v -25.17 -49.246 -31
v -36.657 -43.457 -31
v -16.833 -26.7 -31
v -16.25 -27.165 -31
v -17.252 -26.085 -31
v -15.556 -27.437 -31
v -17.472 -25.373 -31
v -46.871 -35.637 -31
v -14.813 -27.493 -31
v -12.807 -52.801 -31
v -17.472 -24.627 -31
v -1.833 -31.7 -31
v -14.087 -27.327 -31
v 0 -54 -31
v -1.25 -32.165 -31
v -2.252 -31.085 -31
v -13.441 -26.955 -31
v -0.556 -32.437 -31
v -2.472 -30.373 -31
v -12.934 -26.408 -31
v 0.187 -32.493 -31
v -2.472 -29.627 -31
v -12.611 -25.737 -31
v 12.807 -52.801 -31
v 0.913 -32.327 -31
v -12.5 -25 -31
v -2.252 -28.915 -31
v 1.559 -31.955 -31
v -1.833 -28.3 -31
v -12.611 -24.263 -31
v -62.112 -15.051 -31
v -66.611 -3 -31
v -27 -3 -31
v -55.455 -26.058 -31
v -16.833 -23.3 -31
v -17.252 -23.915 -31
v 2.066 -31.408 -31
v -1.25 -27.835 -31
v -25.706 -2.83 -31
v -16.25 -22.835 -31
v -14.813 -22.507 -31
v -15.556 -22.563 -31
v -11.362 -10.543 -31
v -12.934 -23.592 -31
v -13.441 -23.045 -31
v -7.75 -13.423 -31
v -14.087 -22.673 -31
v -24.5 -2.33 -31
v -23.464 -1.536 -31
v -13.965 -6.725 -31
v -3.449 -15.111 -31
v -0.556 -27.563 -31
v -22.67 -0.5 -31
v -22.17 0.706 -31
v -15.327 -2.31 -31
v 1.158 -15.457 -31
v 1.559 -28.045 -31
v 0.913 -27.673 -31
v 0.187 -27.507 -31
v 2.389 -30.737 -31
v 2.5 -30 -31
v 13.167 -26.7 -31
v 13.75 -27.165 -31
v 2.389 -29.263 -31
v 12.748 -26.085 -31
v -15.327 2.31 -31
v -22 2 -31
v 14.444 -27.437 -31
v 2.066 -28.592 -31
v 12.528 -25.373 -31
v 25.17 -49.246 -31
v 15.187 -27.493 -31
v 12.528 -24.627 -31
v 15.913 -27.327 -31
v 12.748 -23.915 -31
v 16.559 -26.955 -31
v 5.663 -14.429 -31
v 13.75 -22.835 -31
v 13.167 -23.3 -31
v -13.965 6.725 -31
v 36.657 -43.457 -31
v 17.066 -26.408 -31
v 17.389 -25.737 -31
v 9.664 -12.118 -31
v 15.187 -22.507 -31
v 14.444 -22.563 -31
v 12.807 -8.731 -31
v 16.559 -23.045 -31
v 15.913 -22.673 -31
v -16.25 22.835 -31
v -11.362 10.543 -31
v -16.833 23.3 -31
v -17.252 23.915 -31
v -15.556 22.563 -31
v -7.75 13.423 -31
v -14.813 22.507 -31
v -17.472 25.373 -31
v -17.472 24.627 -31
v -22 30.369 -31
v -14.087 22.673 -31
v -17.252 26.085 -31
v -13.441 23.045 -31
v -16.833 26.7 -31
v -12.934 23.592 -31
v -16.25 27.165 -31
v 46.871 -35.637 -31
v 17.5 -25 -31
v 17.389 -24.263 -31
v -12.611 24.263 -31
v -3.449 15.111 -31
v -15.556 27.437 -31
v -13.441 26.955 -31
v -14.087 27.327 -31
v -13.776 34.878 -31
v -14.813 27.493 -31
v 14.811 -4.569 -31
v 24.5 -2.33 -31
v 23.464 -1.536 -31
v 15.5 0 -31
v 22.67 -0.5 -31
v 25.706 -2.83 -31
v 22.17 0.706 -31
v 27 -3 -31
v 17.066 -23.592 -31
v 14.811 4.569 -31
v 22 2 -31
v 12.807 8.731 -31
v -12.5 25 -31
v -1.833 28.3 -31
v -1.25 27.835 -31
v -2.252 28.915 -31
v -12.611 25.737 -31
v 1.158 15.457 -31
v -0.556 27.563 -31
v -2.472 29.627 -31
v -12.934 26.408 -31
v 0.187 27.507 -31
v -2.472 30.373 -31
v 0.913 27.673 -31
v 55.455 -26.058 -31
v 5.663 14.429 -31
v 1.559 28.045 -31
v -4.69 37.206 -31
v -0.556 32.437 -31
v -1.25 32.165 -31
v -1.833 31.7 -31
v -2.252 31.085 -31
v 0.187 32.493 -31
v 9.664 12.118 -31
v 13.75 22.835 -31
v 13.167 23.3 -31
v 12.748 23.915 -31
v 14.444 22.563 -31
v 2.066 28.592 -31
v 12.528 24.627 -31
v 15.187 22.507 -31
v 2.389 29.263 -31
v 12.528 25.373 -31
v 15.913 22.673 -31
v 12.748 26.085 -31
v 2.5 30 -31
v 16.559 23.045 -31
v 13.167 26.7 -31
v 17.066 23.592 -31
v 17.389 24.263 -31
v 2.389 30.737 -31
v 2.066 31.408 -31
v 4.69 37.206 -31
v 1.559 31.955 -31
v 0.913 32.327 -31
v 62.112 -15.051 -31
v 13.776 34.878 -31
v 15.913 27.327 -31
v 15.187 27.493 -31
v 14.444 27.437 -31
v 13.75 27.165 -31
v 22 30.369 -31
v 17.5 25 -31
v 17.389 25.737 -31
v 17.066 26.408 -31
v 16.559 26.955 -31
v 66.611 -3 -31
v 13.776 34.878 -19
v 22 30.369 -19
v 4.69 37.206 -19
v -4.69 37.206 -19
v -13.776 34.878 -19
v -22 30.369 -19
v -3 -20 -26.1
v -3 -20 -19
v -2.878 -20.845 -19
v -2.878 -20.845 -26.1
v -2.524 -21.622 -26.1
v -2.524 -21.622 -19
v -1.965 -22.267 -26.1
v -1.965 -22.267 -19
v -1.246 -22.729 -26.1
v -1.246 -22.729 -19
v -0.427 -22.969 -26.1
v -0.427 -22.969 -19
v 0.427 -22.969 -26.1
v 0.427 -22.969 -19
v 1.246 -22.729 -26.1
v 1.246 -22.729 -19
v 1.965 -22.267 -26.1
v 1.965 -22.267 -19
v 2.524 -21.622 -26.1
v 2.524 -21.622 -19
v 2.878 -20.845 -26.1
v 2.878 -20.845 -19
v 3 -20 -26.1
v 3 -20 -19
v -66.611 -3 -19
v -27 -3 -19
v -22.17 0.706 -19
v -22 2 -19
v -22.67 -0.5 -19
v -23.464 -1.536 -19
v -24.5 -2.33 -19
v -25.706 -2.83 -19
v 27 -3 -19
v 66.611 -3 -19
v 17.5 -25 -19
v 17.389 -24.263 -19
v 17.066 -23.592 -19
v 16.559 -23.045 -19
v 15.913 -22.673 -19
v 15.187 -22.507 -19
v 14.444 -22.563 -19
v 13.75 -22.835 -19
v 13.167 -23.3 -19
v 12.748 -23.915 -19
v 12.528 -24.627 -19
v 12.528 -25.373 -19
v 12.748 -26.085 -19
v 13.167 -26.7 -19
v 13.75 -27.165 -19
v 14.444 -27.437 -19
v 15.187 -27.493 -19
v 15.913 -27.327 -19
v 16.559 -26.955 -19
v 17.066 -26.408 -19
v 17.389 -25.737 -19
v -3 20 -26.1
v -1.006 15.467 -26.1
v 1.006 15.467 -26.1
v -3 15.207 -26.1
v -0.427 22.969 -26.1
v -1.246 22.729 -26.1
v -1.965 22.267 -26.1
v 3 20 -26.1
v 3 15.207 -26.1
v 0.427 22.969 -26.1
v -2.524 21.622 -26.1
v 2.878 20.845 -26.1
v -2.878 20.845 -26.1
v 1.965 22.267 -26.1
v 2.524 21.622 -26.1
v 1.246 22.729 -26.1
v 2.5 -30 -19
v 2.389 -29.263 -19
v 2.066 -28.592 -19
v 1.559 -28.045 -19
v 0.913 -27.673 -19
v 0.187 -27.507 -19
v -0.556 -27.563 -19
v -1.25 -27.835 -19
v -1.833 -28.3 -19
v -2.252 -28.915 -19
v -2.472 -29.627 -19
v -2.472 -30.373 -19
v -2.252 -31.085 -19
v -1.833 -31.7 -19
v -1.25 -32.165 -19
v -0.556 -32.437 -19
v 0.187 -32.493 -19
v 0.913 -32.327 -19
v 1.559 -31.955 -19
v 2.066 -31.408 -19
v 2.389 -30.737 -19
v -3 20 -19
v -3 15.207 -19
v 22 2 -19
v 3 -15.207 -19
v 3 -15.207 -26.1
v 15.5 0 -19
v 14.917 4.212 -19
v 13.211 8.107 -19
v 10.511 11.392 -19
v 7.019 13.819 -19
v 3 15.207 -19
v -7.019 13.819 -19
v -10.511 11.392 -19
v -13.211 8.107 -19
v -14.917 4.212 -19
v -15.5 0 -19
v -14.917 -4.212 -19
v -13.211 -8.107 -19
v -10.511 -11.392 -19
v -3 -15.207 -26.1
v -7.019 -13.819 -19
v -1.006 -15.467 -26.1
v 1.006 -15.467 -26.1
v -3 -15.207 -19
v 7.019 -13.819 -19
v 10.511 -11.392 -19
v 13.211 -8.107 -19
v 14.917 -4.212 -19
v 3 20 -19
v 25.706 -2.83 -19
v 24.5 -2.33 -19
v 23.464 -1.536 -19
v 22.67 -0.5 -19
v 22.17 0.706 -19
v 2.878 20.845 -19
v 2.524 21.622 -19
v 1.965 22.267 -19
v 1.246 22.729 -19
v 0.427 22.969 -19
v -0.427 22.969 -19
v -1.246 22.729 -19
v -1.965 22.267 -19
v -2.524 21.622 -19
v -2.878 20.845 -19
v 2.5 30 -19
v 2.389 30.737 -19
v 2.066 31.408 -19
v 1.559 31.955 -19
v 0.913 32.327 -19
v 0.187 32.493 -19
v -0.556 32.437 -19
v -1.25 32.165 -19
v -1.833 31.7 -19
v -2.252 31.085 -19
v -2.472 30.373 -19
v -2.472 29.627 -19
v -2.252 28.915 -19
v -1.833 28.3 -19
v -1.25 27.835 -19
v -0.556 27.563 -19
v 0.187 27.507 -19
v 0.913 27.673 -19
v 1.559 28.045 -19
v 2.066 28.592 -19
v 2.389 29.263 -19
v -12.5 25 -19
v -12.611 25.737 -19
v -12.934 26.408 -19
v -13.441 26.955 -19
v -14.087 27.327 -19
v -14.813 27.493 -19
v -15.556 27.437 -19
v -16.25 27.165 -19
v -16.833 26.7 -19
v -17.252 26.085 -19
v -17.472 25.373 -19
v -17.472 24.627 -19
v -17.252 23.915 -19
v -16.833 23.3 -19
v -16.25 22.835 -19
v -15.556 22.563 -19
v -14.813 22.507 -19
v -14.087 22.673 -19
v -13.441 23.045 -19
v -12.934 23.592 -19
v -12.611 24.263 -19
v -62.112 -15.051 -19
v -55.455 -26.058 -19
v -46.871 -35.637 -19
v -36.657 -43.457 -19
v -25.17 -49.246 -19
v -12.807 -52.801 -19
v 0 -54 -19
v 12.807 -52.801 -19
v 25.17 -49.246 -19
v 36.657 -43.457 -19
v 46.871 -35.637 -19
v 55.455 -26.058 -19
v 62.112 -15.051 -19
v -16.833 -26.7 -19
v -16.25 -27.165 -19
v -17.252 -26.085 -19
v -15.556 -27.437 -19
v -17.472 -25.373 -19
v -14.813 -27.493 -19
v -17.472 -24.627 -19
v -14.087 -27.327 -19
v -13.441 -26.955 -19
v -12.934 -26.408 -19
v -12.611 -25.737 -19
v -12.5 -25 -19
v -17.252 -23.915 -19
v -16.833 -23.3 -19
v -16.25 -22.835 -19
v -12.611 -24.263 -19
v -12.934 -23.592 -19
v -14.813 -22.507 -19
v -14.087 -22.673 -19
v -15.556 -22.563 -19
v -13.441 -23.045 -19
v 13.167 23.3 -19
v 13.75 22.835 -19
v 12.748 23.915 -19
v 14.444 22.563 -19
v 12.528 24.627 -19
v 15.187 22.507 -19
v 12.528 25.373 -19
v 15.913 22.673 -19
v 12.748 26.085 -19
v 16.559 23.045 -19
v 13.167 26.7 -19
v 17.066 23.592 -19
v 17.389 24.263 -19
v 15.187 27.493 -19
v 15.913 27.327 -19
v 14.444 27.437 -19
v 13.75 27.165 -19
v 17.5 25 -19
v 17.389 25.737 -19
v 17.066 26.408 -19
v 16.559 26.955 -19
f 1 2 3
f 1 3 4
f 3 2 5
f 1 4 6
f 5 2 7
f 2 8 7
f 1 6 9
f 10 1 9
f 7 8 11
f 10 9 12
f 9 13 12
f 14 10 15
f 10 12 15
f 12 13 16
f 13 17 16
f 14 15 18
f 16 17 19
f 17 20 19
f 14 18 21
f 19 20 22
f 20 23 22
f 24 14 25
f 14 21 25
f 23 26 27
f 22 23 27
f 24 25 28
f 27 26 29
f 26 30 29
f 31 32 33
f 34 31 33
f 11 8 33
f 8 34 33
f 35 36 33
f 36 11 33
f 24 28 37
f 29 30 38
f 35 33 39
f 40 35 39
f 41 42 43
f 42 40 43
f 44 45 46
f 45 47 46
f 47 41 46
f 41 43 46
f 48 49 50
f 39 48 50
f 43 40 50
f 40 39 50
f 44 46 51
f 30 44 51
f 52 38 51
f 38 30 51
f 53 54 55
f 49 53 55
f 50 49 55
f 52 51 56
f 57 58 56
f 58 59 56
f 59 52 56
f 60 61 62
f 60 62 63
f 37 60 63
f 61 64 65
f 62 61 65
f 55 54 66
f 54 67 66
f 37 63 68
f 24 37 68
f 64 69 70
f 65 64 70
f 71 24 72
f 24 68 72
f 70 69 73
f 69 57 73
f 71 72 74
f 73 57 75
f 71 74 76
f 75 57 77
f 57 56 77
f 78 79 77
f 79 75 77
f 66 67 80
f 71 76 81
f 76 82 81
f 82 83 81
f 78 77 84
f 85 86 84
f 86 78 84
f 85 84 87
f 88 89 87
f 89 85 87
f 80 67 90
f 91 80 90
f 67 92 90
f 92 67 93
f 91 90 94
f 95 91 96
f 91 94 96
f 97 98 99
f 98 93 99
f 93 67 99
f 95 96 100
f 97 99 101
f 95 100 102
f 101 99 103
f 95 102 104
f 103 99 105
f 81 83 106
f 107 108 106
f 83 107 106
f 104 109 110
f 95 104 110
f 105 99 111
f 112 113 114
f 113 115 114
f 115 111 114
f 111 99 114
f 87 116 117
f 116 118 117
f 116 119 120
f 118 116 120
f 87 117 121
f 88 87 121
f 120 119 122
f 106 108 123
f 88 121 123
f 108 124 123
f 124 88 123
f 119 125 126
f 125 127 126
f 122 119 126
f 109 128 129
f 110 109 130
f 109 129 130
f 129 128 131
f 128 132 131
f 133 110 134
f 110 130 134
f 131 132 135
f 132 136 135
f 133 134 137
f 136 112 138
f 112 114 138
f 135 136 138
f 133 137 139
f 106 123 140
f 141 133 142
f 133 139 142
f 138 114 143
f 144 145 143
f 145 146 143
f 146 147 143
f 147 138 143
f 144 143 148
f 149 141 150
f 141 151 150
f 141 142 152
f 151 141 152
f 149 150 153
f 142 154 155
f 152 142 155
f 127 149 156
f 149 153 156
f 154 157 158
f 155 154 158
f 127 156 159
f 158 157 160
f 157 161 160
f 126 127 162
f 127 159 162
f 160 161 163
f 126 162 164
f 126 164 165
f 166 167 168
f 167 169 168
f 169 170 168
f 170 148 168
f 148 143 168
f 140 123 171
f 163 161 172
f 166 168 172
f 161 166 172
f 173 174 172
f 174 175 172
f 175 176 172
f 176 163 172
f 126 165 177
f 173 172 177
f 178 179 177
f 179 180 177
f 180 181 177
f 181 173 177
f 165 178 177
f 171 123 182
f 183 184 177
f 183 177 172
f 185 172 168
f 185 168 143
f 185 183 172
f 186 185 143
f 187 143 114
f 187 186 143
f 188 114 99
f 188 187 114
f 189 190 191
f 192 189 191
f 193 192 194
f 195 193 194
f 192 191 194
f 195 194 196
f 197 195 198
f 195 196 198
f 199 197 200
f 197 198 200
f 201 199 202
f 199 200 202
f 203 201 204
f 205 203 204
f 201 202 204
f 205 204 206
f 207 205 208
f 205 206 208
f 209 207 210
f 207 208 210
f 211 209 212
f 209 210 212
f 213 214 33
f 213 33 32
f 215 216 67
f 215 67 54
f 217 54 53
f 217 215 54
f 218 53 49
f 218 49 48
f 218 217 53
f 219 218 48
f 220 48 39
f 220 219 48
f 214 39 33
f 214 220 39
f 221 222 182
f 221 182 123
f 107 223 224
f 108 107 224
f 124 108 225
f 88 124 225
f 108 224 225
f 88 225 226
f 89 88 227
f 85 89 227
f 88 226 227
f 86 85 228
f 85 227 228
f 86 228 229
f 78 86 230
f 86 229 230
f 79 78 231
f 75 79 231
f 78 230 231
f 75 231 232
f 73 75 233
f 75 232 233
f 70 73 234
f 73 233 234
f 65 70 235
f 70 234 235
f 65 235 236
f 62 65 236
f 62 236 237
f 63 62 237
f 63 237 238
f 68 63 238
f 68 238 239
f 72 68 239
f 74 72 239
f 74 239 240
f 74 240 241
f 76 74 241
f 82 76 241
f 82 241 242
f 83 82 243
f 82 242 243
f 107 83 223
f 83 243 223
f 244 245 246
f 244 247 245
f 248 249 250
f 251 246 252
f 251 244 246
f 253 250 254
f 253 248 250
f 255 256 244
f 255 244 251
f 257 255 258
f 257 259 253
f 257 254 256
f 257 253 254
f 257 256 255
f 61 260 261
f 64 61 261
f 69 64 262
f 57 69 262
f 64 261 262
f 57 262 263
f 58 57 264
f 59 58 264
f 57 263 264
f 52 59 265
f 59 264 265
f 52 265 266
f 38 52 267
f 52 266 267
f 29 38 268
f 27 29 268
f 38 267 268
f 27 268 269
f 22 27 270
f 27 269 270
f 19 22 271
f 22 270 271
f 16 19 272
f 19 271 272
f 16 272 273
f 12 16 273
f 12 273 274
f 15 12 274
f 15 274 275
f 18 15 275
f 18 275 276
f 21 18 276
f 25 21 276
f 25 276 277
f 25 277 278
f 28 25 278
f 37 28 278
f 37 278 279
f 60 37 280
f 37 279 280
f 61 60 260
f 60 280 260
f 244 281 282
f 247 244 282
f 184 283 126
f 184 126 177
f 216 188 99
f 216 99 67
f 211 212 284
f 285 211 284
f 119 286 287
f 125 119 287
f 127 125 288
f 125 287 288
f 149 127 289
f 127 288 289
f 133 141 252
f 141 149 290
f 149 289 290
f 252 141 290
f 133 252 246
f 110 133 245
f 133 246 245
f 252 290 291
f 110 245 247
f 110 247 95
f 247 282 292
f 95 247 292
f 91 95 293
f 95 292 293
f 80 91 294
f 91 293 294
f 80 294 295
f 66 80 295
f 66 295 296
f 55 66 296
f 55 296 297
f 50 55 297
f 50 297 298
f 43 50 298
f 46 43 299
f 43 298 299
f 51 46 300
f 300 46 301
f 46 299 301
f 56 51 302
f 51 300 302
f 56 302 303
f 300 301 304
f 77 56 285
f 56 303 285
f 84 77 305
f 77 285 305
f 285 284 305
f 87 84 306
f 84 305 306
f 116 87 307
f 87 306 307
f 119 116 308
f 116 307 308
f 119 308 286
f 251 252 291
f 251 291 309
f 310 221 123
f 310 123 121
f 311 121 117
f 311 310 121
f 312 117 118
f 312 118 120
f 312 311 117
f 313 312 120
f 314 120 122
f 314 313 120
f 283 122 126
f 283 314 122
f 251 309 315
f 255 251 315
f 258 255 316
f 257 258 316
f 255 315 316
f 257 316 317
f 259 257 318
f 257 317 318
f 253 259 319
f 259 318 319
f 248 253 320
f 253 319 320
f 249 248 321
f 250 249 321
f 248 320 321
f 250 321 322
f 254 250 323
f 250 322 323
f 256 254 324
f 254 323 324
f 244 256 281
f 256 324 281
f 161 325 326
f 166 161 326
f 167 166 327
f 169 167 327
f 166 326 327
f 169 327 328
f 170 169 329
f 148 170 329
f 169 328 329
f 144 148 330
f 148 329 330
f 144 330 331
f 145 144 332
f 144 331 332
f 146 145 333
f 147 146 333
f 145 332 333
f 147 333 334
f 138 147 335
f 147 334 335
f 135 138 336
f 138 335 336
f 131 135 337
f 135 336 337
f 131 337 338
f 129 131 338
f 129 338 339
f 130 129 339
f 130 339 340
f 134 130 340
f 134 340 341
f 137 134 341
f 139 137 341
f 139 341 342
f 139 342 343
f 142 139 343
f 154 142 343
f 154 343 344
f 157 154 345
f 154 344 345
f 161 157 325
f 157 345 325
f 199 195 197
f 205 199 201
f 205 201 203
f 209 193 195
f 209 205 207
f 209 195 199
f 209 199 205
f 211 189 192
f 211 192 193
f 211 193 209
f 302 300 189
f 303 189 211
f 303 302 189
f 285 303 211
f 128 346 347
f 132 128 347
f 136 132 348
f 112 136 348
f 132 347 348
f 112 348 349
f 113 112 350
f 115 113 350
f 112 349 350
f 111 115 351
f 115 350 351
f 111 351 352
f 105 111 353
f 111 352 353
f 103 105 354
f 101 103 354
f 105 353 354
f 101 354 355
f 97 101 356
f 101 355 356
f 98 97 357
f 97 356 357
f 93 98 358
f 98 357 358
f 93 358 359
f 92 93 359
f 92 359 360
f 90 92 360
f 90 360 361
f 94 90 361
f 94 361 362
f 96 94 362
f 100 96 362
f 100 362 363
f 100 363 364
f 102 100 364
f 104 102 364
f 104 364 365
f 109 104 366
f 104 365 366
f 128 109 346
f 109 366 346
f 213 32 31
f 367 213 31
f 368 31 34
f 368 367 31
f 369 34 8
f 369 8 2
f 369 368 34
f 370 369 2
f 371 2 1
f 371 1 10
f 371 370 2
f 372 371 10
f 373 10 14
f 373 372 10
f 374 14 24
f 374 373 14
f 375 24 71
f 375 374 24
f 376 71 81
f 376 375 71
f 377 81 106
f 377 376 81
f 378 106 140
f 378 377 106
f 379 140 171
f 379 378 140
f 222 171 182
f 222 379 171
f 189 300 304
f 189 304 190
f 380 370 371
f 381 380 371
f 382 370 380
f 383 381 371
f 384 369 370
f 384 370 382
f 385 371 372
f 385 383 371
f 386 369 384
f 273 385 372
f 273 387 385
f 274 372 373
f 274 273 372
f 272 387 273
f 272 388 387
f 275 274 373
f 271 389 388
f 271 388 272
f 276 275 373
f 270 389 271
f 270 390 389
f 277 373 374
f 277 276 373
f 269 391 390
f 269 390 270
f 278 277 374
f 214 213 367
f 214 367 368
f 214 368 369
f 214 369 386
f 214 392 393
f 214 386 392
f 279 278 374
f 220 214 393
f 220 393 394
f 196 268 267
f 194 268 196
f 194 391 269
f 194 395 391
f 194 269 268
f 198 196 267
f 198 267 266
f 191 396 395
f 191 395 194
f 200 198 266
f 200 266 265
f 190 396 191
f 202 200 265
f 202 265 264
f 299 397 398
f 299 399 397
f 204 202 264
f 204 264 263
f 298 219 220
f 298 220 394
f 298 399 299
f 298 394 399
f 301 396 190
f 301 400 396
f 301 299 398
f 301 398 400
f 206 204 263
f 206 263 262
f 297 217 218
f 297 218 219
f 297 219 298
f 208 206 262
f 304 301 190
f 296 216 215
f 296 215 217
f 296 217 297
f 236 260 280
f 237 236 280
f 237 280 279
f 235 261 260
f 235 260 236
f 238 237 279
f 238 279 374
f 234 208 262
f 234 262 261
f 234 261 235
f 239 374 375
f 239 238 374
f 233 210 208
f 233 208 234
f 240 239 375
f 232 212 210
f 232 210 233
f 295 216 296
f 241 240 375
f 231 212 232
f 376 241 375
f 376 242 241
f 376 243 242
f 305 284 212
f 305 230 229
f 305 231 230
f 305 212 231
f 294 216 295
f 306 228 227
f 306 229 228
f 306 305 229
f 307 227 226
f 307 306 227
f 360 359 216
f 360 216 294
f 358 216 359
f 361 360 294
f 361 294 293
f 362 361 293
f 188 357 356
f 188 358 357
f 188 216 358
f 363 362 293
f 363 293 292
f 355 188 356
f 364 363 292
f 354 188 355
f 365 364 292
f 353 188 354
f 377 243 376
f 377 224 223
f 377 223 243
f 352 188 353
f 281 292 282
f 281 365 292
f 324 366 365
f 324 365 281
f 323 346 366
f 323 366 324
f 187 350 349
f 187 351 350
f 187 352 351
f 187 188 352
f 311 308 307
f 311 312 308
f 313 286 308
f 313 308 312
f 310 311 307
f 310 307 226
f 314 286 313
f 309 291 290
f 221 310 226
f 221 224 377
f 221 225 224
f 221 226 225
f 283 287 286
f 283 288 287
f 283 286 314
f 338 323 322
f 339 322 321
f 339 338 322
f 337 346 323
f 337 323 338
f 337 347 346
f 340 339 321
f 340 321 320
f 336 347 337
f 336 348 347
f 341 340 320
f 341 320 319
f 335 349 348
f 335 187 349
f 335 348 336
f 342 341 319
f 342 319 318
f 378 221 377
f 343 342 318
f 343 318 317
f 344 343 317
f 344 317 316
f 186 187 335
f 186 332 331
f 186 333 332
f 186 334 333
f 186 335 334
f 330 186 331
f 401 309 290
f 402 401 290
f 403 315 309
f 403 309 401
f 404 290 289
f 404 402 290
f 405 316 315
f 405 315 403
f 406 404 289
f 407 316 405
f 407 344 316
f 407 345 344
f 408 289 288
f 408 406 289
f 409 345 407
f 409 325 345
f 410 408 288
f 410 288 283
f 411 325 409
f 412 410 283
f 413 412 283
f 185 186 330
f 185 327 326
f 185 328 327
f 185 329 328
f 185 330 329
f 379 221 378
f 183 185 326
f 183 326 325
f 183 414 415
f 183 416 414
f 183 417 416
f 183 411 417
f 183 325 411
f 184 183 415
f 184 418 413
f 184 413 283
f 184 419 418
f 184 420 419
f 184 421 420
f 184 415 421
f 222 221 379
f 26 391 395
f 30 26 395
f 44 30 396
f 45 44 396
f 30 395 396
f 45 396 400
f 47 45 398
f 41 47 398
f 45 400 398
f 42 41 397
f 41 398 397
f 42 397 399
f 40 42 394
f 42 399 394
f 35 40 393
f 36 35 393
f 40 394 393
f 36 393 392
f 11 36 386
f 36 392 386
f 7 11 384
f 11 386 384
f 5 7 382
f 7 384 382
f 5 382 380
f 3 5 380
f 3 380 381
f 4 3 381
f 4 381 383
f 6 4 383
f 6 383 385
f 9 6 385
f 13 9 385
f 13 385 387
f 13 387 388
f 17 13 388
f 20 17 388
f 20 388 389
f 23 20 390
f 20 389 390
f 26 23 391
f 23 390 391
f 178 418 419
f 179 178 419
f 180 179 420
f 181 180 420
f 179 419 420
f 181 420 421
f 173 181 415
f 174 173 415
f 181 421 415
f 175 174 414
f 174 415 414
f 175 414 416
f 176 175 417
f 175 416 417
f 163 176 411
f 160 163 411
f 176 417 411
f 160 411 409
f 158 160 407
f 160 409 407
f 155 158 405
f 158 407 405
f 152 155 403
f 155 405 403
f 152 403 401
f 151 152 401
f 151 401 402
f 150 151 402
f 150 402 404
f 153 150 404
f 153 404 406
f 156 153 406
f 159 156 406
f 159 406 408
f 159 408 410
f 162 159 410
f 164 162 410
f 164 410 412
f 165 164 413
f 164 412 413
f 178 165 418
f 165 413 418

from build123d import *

# Parameters (mm, degrees)
F2_R     = 2.5
F2_R_2   = 15.5
F3_DEPTH = 12
F5_DEPTH = 7.1


with BuildPart() as f3:
    # F2 (on offset) → F3 (new body)
    with BuildSketch(Plane.XY.offset(-19)):
        with BuildLine():
            ThreePointArc((-22, 2), (-23.464466, -1.535534), (-27, -3))
            Line((-27, -3), (-66.61081, -3))
            ThreePointArc((-66.61081, -3), (0, -54), (66.61081, -3))
            Line((66.61081, -3), (27, -3))
            ThreePointArc((27, -3), (23.464466, -1.535534), (22, 2))
            Line((22, 2), (22, 30.368569))
            ThreePointArc((22, 30.368569), (0, 37.5), (-22, 30.368569))
            Line((-22, 30.368569), (-22, 2))
        make_face()
        with Locations((-15, -25)):
            Circle(F2_R, mode=Mode.SUBTRACT)
        with Locations((0, -30)):
            Circle(F2_R, mode=Mode.SUBTRACT)
        with Locations((15, -25)):
            Circle(F2_R, mode=Mode.SUBTRACT)
        with Locations((-15, 25)):
            Circle(F2_R, mode=Mode.SUBTRACT)
        Circle(F2_R_2, mode=Mode.SUBTRACT)
        with Locations((15, 25)):
            Circle(F2_R, mode=Mode.SUBTRACT)
        with Locations((0, 30)):
            Circle(F2_R, mode=Mode.SUBTRACT)
    extrude(amount=-F3_DEPTH)

    # F4 (on offset) → F5 (cut)
    with BuildSketch(Plane.XY.offset(-19)):
        with BuildLine():
            ThreePointArc((3, 20), (0, 23), (-3, 20))
            Line((-3, 20), (-3, 0))
            Line((-3, 0), (-3, -20))
            ThreePointArc((-3, -20), (0, -23), (3, -20))
            Line((3, -20), (3, 0))
            Line((3, 0), (3, 20))
        make_face()
    extrude(amount=-F5_DEPTH, mode=Mode.SUBTRACT)


solid = f3.part
